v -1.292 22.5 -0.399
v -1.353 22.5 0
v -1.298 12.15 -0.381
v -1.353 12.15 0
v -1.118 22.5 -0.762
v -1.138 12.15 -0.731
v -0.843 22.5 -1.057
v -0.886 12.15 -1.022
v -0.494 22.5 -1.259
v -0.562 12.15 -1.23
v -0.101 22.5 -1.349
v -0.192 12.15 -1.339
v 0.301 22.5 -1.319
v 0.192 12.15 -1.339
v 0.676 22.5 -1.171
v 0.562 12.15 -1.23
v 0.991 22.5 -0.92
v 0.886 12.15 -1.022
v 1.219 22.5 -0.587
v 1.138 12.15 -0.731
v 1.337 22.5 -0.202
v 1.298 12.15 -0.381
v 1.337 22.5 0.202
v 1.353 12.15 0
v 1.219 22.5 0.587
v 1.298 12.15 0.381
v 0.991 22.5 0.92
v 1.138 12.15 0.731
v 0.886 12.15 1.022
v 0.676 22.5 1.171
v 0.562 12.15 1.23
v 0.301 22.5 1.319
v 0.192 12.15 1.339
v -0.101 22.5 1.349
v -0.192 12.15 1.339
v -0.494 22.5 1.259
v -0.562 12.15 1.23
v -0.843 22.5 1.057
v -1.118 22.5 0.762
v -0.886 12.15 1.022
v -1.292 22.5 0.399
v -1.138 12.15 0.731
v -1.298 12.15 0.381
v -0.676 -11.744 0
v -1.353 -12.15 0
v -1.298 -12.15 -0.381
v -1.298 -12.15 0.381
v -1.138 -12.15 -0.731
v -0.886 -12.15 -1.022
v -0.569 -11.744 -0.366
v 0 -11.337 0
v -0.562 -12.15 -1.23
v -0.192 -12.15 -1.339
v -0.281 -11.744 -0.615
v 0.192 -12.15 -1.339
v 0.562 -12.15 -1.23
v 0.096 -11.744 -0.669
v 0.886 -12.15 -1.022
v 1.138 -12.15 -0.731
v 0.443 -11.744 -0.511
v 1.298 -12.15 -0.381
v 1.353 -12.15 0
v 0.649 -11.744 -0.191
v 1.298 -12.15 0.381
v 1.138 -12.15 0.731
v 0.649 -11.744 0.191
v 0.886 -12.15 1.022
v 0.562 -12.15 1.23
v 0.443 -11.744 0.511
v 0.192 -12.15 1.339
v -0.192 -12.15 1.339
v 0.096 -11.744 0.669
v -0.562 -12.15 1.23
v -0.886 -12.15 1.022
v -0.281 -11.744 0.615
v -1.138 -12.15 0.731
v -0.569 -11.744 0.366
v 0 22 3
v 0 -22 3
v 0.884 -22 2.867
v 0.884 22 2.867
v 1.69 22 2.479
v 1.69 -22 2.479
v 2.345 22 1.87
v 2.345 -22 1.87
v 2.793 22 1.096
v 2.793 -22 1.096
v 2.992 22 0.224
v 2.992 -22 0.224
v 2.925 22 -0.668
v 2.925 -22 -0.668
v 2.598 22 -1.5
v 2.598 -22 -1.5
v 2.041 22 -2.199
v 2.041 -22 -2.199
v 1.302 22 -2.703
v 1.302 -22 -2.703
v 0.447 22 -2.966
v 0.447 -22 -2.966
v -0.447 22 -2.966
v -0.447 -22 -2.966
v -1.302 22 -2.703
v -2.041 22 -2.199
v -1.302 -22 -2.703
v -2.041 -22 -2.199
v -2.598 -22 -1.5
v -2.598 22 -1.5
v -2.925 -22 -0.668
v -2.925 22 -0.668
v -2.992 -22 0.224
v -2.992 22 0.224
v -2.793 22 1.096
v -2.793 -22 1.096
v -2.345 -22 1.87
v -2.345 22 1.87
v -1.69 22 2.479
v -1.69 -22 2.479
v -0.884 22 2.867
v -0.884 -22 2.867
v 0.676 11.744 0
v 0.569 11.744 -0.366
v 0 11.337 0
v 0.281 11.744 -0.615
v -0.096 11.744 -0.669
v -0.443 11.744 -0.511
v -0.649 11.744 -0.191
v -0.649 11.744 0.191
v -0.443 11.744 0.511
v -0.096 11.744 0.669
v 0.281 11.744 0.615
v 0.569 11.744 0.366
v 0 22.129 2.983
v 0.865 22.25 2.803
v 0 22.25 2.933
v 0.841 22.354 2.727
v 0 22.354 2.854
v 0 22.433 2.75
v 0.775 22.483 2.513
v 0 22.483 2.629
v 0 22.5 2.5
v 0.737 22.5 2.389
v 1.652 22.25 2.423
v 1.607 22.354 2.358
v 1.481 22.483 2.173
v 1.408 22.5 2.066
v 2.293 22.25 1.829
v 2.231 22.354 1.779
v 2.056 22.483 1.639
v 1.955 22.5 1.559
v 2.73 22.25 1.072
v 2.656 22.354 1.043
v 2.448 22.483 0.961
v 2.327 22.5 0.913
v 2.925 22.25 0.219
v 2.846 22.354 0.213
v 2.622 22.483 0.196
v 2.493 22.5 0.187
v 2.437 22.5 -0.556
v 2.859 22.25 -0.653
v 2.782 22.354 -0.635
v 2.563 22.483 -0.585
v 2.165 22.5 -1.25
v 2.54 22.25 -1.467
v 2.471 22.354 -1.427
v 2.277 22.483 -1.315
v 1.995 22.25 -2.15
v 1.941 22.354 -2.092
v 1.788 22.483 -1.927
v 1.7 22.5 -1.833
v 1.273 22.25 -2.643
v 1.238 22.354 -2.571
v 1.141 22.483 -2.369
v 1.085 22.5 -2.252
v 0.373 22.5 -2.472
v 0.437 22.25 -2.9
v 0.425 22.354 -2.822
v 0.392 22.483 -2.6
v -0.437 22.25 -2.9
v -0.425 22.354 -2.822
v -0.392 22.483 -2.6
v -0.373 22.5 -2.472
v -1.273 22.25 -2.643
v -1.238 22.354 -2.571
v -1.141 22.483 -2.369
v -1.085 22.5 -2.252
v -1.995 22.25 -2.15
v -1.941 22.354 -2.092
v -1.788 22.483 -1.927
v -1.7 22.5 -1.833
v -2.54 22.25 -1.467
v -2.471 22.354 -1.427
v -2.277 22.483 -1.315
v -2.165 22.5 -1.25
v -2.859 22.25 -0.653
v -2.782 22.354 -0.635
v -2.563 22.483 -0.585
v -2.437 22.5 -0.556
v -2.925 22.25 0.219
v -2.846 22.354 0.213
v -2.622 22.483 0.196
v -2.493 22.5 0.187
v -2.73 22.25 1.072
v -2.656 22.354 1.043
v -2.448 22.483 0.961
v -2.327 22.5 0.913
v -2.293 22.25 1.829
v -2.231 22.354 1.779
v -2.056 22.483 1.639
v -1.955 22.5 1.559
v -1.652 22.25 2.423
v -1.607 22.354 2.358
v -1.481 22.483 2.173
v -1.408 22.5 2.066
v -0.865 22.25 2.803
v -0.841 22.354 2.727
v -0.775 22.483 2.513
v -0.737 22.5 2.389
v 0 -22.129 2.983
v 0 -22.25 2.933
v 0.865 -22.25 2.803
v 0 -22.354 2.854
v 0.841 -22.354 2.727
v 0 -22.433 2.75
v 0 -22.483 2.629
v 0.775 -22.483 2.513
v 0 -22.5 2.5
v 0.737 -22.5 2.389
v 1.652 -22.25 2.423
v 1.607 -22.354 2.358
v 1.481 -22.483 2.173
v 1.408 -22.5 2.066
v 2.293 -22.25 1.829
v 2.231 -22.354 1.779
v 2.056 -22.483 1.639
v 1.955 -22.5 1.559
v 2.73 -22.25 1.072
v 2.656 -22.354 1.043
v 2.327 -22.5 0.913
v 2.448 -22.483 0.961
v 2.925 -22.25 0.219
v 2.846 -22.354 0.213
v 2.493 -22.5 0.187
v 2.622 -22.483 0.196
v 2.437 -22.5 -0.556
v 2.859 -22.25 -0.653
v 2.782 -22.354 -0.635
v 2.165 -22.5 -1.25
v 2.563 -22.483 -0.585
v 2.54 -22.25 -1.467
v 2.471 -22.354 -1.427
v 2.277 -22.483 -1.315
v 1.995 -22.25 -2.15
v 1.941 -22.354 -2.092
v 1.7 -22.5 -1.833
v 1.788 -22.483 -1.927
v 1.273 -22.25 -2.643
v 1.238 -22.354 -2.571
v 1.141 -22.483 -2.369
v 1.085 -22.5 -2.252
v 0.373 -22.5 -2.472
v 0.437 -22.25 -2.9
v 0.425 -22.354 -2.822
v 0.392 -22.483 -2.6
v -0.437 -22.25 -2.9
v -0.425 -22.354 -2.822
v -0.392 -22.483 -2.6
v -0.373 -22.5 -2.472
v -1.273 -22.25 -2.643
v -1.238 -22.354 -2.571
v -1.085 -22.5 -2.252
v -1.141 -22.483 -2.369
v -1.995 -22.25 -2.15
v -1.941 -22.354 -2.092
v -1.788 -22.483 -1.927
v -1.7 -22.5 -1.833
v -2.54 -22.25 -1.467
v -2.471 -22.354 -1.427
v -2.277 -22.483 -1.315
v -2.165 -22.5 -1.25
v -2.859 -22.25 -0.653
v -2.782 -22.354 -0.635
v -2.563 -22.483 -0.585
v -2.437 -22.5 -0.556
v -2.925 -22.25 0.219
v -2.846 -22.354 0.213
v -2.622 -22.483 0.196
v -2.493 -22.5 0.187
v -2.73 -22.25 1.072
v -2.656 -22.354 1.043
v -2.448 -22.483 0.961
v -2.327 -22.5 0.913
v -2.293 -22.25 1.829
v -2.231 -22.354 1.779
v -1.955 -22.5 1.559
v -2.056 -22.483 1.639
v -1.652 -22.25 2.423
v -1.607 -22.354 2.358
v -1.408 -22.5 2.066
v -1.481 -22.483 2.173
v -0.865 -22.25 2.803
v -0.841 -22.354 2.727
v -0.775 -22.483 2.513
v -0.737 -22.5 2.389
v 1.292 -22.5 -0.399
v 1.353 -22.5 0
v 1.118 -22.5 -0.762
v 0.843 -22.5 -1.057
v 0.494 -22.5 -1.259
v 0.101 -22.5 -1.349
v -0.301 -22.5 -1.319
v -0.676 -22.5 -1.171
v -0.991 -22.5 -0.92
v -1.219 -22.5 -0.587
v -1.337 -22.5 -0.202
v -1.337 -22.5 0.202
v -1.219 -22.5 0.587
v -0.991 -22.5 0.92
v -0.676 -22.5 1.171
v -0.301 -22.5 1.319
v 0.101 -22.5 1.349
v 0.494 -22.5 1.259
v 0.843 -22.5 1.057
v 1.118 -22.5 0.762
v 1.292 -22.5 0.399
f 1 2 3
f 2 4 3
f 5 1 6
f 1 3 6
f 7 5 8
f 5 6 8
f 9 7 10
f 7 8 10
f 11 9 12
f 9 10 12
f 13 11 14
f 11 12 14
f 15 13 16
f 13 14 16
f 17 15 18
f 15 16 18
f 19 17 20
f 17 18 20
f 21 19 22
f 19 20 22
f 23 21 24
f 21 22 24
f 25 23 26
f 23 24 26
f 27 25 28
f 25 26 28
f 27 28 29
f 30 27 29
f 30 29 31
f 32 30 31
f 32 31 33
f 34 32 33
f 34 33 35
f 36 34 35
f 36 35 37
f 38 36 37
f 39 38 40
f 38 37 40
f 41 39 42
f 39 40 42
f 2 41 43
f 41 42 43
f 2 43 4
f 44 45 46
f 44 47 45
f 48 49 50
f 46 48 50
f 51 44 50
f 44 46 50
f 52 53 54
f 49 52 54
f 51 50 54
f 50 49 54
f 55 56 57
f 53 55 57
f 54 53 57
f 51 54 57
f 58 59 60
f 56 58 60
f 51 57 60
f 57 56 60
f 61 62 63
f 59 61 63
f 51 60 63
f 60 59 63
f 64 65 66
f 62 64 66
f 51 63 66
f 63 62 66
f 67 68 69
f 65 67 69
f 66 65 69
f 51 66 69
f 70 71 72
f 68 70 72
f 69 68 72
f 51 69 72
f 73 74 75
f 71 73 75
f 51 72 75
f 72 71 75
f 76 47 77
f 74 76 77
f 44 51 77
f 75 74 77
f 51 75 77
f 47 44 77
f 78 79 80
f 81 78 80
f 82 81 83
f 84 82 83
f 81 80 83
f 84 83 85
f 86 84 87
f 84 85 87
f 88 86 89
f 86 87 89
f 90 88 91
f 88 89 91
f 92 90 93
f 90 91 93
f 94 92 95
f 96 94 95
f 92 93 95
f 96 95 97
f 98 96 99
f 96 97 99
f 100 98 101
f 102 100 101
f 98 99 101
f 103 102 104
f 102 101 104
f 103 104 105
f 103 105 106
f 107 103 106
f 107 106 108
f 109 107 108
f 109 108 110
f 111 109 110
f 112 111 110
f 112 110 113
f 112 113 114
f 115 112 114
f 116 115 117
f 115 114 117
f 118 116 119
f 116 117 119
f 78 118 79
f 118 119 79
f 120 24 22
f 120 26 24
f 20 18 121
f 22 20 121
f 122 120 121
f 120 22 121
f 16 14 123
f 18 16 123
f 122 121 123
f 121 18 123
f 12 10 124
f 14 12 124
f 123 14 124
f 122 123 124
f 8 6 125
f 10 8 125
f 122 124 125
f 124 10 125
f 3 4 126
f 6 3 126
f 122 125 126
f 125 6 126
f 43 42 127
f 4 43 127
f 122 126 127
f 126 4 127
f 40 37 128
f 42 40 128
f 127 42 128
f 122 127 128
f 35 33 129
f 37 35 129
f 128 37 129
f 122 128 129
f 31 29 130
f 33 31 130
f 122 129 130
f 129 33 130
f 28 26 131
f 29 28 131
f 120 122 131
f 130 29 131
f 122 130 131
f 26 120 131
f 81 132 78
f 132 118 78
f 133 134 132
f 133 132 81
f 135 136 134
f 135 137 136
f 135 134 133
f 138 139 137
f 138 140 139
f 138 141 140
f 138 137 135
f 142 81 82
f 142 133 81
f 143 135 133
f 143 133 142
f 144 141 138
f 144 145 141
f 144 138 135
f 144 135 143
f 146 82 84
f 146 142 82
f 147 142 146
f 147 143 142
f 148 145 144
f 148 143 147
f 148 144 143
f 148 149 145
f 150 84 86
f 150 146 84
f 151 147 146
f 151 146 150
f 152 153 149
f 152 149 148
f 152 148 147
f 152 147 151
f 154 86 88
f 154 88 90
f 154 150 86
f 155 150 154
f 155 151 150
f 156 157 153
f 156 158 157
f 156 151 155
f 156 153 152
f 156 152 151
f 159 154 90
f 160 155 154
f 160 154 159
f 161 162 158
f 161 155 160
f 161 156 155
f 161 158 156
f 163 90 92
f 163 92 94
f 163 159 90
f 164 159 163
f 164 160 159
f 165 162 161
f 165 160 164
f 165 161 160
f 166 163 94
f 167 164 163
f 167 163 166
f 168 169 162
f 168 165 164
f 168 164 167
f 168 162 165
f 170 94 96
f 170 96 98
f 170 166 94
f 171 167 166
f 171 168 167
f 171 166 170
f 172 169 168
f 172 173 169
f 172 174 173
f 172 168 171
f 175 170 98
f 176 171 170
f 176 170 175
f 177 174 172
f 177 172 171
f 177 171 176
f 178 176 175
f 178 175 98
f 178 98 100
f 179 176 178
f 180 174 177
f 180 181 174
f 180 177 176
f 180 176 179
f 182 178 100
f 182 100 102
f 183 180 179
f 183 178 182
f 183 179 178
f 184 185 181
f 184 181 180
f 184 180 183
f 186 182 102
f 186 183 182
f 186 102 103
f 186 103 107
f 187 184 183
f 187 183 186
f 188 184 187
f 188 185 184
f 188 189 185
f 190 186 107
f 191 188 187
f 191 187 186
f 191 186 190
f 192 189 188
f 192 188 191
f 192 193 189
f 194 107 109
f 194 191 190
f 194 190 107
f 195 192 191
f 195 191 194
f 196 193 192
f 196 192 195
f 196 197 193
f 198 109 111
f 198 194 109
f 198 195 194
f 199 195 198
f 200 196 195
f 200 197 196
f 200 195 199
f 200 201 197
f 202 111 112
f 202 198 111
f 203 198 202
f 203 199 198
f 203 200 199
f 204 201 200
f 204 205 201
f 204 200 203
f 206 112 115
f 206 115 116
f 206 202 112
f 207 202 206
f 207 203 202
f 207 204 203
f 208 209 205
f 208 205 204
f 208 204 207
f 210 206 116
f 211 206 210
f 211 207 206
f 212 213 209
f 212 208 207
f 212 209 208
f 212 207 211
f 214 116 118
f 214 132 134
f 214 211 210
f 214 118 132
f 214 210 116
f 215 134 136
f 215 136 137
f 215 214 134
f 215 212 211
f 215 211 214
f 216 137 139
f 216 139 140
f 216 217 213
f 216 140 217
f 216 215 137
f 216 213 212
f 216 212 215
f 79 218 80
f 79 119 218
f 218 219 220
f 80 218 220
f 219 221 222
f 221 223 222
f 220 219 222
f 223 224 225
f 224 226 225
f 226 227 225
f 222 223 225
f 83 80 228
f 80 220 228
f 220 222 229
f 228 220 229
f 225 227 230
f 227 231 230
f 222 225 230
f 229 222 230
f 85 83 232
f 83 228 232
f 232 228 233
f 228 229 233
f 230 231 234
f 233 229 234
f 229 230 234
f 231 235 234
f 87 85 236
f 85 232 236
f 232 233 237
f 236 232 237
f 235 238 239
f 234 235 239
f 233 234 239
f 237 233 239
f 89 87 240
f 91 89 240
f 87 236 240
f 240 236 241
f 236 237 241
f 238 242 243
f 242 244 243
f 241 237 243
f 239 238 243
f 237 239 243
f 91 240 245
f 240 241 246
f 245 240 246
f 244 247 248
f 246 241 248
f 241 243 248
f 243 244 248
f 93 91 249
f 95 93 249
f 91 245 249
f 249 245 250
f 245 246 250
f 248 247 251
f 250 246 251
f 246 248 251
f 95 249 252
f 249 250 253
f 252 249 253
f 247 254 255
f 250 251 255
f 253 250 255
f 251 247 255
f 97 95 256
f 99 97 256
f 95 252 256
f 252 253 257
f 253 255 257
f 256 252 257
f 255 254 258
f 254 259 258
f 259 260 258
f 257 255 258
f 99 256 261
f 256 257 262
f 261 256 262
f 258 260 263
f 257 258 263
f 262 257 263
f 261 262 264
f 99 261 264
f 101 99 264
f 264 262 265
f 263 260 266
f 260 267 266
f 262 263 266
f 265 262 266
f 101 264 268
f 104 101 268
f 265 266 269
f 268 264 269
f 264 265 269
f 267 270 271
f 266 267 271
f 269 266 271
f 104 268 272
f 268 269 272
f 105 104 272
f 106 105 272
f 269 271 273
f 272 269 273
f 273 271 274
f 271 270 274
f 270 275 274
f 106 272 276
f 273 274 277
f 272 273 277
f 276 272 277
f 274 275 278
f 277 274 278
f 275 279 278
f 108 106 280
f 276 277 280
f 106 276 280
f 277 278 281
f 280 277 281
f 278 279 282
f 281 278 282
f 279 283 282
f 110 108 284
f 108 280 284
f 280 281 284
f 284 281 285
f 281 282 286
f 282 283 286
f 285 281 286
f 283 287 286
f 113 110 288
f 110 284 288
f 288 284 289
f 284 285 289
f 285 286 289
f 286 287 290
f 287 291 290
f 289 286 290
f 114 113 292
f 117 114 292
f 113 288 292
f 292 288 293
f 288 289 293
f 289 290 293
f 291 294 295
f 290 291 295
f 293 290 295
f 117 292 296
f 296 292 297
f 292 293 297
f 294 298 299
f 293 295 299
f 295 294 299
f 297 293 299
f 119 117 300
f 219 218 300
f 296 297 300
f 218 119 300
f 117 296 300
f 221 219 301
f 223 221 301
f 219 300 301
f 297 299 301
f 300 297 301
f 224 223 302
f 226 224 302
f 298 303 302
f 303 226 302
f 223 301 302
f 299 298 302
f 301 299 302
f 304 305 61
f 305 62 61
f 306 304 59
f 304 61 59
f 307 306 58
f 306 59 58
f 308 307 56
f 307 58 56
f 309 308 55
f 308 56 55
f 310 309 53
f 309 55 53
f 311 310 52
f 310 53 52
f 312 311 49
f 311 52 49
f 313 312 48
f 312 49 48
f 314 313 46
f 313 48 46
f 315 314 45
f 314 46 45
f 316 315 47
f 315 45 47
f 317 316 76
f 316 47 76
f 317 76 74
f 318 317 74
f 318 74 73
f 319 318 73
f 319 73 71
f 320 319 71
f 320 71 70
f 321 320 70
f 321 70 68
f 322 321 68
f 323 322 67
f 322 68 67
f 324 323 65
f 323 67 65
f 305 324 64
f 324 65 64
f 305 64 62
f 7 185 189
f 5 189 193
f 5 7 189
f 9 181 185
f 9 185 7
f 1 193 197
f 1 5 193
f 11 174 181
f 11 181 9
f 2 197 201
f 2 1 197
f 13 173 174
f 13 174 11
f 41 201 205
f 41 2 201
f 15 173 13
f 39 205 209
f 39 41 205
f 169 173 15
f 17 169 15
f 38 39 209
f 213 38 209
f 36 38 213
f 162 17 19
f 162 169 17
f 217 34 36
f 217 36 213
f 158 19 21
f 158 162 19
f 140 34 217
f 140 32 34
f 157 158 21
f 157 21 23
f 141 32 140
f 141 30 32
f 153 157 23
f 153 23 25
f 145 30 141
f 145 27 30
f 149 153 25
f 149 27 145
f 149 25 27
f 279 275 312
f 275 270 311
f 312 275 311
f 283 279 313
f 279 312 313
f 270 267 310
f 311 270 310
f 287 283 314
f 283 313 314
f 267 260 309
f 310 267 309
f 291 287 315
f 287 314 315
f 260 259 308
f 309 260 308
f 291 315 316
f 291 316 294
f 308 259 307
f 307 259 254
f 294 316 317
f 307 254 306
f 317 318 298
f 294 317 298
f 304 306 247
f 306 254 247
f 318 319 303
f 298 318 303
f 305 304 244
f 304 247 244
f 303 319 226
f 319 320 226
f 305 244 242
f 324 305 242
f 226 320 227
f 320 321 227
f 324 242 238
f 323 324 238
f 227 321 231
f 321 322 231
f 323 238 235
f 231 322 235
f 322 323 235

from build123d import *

# Parameters (mm, degrees)
BOSS_EXTRUDE1_DEPTH       = 22.5
BOSS_EXTRUDE1_DEPTH_BACK  = 22.5
SKETCH1_R                 = 3
F_6_32_TAPPED_HOLE1_D     = 2.7051
F_6_32_TAPPED_HOLE1_DEPTH = 10.35
F_6_32_TAPPED_HOLE1_TIP   = 0.81269403
FILLET1_R                 = 0.5
F_6_32_TAPPED_HOLE2_D     = 2.7051
F_6_32_TAPPED_HOLE2_DEPTH = 10.35
F_6_32_TAPPED_HOLE2_TIP   = 0.81269403


with BuildPart() as part:
    # Sketch1 → Boss-Extrude1 (new, two sides: drawn at the far end of the back side and taken through both)
    with BuildSketch(Plane(origin=(0, 0, 0), x_dir=(1, 0, 0), z_dir=(0, 1, 0)).offset(-BOSS_EXTRUDE1_DEPTH_BACK)):
        Circle(SKETCH1_R)
    extrude(amount=BOSS_EXTRUDE1_DEPTH + BOSS_EXTRUDE1_DEPTH_BACK)

    # #6-32 Tapped Hole1
    with Locations(Plane(origin=(0, 22.5, 0), x_dir=(1, 0, 0), z_dir=(0, 1, 0))):
        with Locations((0, 0)):
            Hole(F_6_32_TAPPED_HOLE1_D / 2, depth=F_6_32_TAPPED_HOLE1_DEPTH)
            with Locations((0, 0, -(F_6_32_TAPPED_HOLE1_DEPTH + F_6_32_TAPPED_HOLE1_TIP / 2))):  # 118° drill point
                Cone(0, F_6_32_TAPPED_HOLE1_D / 2, F_6_32_TAPPED_HOLE1_TIP, mode=Mode.SUBTRACT)

    # Fillet1
    fillet1_edges = [part.edges().sort_by_distance(p)[0] for p in [
        (-3, 22.5, 0),
        (-3, -22.5, 0),
    ]]
    fillet(fillet1_edges, radius=FILLET1_R)

    # #6-32 Tapped Hole2
    with Locations(Plane(origin=(0, -22.5, 0), x_dir=(-1, 0, 0), z_dir=(0, -1, 0))):
        with Locations((0, 0)):
            Hole(F_6_32_TAPPED_HOLE2_D / 2, depth=F_6_32_TAPPED_HOLE2_DEPTH)
            with Locations((0, 0, -(F_6_32_TAPPED_HOLE2_DEPTH + F_6_32_TAPPED_HOLE2_TIP / 2))):  # 118° drill point
                Cone(0, F_6_32_TAPPED_HOLE2_D / 2, F_6_32_TAPPED_HOLE2_TIP, mode=Mode.SUBTRACT)


solid = part.part
